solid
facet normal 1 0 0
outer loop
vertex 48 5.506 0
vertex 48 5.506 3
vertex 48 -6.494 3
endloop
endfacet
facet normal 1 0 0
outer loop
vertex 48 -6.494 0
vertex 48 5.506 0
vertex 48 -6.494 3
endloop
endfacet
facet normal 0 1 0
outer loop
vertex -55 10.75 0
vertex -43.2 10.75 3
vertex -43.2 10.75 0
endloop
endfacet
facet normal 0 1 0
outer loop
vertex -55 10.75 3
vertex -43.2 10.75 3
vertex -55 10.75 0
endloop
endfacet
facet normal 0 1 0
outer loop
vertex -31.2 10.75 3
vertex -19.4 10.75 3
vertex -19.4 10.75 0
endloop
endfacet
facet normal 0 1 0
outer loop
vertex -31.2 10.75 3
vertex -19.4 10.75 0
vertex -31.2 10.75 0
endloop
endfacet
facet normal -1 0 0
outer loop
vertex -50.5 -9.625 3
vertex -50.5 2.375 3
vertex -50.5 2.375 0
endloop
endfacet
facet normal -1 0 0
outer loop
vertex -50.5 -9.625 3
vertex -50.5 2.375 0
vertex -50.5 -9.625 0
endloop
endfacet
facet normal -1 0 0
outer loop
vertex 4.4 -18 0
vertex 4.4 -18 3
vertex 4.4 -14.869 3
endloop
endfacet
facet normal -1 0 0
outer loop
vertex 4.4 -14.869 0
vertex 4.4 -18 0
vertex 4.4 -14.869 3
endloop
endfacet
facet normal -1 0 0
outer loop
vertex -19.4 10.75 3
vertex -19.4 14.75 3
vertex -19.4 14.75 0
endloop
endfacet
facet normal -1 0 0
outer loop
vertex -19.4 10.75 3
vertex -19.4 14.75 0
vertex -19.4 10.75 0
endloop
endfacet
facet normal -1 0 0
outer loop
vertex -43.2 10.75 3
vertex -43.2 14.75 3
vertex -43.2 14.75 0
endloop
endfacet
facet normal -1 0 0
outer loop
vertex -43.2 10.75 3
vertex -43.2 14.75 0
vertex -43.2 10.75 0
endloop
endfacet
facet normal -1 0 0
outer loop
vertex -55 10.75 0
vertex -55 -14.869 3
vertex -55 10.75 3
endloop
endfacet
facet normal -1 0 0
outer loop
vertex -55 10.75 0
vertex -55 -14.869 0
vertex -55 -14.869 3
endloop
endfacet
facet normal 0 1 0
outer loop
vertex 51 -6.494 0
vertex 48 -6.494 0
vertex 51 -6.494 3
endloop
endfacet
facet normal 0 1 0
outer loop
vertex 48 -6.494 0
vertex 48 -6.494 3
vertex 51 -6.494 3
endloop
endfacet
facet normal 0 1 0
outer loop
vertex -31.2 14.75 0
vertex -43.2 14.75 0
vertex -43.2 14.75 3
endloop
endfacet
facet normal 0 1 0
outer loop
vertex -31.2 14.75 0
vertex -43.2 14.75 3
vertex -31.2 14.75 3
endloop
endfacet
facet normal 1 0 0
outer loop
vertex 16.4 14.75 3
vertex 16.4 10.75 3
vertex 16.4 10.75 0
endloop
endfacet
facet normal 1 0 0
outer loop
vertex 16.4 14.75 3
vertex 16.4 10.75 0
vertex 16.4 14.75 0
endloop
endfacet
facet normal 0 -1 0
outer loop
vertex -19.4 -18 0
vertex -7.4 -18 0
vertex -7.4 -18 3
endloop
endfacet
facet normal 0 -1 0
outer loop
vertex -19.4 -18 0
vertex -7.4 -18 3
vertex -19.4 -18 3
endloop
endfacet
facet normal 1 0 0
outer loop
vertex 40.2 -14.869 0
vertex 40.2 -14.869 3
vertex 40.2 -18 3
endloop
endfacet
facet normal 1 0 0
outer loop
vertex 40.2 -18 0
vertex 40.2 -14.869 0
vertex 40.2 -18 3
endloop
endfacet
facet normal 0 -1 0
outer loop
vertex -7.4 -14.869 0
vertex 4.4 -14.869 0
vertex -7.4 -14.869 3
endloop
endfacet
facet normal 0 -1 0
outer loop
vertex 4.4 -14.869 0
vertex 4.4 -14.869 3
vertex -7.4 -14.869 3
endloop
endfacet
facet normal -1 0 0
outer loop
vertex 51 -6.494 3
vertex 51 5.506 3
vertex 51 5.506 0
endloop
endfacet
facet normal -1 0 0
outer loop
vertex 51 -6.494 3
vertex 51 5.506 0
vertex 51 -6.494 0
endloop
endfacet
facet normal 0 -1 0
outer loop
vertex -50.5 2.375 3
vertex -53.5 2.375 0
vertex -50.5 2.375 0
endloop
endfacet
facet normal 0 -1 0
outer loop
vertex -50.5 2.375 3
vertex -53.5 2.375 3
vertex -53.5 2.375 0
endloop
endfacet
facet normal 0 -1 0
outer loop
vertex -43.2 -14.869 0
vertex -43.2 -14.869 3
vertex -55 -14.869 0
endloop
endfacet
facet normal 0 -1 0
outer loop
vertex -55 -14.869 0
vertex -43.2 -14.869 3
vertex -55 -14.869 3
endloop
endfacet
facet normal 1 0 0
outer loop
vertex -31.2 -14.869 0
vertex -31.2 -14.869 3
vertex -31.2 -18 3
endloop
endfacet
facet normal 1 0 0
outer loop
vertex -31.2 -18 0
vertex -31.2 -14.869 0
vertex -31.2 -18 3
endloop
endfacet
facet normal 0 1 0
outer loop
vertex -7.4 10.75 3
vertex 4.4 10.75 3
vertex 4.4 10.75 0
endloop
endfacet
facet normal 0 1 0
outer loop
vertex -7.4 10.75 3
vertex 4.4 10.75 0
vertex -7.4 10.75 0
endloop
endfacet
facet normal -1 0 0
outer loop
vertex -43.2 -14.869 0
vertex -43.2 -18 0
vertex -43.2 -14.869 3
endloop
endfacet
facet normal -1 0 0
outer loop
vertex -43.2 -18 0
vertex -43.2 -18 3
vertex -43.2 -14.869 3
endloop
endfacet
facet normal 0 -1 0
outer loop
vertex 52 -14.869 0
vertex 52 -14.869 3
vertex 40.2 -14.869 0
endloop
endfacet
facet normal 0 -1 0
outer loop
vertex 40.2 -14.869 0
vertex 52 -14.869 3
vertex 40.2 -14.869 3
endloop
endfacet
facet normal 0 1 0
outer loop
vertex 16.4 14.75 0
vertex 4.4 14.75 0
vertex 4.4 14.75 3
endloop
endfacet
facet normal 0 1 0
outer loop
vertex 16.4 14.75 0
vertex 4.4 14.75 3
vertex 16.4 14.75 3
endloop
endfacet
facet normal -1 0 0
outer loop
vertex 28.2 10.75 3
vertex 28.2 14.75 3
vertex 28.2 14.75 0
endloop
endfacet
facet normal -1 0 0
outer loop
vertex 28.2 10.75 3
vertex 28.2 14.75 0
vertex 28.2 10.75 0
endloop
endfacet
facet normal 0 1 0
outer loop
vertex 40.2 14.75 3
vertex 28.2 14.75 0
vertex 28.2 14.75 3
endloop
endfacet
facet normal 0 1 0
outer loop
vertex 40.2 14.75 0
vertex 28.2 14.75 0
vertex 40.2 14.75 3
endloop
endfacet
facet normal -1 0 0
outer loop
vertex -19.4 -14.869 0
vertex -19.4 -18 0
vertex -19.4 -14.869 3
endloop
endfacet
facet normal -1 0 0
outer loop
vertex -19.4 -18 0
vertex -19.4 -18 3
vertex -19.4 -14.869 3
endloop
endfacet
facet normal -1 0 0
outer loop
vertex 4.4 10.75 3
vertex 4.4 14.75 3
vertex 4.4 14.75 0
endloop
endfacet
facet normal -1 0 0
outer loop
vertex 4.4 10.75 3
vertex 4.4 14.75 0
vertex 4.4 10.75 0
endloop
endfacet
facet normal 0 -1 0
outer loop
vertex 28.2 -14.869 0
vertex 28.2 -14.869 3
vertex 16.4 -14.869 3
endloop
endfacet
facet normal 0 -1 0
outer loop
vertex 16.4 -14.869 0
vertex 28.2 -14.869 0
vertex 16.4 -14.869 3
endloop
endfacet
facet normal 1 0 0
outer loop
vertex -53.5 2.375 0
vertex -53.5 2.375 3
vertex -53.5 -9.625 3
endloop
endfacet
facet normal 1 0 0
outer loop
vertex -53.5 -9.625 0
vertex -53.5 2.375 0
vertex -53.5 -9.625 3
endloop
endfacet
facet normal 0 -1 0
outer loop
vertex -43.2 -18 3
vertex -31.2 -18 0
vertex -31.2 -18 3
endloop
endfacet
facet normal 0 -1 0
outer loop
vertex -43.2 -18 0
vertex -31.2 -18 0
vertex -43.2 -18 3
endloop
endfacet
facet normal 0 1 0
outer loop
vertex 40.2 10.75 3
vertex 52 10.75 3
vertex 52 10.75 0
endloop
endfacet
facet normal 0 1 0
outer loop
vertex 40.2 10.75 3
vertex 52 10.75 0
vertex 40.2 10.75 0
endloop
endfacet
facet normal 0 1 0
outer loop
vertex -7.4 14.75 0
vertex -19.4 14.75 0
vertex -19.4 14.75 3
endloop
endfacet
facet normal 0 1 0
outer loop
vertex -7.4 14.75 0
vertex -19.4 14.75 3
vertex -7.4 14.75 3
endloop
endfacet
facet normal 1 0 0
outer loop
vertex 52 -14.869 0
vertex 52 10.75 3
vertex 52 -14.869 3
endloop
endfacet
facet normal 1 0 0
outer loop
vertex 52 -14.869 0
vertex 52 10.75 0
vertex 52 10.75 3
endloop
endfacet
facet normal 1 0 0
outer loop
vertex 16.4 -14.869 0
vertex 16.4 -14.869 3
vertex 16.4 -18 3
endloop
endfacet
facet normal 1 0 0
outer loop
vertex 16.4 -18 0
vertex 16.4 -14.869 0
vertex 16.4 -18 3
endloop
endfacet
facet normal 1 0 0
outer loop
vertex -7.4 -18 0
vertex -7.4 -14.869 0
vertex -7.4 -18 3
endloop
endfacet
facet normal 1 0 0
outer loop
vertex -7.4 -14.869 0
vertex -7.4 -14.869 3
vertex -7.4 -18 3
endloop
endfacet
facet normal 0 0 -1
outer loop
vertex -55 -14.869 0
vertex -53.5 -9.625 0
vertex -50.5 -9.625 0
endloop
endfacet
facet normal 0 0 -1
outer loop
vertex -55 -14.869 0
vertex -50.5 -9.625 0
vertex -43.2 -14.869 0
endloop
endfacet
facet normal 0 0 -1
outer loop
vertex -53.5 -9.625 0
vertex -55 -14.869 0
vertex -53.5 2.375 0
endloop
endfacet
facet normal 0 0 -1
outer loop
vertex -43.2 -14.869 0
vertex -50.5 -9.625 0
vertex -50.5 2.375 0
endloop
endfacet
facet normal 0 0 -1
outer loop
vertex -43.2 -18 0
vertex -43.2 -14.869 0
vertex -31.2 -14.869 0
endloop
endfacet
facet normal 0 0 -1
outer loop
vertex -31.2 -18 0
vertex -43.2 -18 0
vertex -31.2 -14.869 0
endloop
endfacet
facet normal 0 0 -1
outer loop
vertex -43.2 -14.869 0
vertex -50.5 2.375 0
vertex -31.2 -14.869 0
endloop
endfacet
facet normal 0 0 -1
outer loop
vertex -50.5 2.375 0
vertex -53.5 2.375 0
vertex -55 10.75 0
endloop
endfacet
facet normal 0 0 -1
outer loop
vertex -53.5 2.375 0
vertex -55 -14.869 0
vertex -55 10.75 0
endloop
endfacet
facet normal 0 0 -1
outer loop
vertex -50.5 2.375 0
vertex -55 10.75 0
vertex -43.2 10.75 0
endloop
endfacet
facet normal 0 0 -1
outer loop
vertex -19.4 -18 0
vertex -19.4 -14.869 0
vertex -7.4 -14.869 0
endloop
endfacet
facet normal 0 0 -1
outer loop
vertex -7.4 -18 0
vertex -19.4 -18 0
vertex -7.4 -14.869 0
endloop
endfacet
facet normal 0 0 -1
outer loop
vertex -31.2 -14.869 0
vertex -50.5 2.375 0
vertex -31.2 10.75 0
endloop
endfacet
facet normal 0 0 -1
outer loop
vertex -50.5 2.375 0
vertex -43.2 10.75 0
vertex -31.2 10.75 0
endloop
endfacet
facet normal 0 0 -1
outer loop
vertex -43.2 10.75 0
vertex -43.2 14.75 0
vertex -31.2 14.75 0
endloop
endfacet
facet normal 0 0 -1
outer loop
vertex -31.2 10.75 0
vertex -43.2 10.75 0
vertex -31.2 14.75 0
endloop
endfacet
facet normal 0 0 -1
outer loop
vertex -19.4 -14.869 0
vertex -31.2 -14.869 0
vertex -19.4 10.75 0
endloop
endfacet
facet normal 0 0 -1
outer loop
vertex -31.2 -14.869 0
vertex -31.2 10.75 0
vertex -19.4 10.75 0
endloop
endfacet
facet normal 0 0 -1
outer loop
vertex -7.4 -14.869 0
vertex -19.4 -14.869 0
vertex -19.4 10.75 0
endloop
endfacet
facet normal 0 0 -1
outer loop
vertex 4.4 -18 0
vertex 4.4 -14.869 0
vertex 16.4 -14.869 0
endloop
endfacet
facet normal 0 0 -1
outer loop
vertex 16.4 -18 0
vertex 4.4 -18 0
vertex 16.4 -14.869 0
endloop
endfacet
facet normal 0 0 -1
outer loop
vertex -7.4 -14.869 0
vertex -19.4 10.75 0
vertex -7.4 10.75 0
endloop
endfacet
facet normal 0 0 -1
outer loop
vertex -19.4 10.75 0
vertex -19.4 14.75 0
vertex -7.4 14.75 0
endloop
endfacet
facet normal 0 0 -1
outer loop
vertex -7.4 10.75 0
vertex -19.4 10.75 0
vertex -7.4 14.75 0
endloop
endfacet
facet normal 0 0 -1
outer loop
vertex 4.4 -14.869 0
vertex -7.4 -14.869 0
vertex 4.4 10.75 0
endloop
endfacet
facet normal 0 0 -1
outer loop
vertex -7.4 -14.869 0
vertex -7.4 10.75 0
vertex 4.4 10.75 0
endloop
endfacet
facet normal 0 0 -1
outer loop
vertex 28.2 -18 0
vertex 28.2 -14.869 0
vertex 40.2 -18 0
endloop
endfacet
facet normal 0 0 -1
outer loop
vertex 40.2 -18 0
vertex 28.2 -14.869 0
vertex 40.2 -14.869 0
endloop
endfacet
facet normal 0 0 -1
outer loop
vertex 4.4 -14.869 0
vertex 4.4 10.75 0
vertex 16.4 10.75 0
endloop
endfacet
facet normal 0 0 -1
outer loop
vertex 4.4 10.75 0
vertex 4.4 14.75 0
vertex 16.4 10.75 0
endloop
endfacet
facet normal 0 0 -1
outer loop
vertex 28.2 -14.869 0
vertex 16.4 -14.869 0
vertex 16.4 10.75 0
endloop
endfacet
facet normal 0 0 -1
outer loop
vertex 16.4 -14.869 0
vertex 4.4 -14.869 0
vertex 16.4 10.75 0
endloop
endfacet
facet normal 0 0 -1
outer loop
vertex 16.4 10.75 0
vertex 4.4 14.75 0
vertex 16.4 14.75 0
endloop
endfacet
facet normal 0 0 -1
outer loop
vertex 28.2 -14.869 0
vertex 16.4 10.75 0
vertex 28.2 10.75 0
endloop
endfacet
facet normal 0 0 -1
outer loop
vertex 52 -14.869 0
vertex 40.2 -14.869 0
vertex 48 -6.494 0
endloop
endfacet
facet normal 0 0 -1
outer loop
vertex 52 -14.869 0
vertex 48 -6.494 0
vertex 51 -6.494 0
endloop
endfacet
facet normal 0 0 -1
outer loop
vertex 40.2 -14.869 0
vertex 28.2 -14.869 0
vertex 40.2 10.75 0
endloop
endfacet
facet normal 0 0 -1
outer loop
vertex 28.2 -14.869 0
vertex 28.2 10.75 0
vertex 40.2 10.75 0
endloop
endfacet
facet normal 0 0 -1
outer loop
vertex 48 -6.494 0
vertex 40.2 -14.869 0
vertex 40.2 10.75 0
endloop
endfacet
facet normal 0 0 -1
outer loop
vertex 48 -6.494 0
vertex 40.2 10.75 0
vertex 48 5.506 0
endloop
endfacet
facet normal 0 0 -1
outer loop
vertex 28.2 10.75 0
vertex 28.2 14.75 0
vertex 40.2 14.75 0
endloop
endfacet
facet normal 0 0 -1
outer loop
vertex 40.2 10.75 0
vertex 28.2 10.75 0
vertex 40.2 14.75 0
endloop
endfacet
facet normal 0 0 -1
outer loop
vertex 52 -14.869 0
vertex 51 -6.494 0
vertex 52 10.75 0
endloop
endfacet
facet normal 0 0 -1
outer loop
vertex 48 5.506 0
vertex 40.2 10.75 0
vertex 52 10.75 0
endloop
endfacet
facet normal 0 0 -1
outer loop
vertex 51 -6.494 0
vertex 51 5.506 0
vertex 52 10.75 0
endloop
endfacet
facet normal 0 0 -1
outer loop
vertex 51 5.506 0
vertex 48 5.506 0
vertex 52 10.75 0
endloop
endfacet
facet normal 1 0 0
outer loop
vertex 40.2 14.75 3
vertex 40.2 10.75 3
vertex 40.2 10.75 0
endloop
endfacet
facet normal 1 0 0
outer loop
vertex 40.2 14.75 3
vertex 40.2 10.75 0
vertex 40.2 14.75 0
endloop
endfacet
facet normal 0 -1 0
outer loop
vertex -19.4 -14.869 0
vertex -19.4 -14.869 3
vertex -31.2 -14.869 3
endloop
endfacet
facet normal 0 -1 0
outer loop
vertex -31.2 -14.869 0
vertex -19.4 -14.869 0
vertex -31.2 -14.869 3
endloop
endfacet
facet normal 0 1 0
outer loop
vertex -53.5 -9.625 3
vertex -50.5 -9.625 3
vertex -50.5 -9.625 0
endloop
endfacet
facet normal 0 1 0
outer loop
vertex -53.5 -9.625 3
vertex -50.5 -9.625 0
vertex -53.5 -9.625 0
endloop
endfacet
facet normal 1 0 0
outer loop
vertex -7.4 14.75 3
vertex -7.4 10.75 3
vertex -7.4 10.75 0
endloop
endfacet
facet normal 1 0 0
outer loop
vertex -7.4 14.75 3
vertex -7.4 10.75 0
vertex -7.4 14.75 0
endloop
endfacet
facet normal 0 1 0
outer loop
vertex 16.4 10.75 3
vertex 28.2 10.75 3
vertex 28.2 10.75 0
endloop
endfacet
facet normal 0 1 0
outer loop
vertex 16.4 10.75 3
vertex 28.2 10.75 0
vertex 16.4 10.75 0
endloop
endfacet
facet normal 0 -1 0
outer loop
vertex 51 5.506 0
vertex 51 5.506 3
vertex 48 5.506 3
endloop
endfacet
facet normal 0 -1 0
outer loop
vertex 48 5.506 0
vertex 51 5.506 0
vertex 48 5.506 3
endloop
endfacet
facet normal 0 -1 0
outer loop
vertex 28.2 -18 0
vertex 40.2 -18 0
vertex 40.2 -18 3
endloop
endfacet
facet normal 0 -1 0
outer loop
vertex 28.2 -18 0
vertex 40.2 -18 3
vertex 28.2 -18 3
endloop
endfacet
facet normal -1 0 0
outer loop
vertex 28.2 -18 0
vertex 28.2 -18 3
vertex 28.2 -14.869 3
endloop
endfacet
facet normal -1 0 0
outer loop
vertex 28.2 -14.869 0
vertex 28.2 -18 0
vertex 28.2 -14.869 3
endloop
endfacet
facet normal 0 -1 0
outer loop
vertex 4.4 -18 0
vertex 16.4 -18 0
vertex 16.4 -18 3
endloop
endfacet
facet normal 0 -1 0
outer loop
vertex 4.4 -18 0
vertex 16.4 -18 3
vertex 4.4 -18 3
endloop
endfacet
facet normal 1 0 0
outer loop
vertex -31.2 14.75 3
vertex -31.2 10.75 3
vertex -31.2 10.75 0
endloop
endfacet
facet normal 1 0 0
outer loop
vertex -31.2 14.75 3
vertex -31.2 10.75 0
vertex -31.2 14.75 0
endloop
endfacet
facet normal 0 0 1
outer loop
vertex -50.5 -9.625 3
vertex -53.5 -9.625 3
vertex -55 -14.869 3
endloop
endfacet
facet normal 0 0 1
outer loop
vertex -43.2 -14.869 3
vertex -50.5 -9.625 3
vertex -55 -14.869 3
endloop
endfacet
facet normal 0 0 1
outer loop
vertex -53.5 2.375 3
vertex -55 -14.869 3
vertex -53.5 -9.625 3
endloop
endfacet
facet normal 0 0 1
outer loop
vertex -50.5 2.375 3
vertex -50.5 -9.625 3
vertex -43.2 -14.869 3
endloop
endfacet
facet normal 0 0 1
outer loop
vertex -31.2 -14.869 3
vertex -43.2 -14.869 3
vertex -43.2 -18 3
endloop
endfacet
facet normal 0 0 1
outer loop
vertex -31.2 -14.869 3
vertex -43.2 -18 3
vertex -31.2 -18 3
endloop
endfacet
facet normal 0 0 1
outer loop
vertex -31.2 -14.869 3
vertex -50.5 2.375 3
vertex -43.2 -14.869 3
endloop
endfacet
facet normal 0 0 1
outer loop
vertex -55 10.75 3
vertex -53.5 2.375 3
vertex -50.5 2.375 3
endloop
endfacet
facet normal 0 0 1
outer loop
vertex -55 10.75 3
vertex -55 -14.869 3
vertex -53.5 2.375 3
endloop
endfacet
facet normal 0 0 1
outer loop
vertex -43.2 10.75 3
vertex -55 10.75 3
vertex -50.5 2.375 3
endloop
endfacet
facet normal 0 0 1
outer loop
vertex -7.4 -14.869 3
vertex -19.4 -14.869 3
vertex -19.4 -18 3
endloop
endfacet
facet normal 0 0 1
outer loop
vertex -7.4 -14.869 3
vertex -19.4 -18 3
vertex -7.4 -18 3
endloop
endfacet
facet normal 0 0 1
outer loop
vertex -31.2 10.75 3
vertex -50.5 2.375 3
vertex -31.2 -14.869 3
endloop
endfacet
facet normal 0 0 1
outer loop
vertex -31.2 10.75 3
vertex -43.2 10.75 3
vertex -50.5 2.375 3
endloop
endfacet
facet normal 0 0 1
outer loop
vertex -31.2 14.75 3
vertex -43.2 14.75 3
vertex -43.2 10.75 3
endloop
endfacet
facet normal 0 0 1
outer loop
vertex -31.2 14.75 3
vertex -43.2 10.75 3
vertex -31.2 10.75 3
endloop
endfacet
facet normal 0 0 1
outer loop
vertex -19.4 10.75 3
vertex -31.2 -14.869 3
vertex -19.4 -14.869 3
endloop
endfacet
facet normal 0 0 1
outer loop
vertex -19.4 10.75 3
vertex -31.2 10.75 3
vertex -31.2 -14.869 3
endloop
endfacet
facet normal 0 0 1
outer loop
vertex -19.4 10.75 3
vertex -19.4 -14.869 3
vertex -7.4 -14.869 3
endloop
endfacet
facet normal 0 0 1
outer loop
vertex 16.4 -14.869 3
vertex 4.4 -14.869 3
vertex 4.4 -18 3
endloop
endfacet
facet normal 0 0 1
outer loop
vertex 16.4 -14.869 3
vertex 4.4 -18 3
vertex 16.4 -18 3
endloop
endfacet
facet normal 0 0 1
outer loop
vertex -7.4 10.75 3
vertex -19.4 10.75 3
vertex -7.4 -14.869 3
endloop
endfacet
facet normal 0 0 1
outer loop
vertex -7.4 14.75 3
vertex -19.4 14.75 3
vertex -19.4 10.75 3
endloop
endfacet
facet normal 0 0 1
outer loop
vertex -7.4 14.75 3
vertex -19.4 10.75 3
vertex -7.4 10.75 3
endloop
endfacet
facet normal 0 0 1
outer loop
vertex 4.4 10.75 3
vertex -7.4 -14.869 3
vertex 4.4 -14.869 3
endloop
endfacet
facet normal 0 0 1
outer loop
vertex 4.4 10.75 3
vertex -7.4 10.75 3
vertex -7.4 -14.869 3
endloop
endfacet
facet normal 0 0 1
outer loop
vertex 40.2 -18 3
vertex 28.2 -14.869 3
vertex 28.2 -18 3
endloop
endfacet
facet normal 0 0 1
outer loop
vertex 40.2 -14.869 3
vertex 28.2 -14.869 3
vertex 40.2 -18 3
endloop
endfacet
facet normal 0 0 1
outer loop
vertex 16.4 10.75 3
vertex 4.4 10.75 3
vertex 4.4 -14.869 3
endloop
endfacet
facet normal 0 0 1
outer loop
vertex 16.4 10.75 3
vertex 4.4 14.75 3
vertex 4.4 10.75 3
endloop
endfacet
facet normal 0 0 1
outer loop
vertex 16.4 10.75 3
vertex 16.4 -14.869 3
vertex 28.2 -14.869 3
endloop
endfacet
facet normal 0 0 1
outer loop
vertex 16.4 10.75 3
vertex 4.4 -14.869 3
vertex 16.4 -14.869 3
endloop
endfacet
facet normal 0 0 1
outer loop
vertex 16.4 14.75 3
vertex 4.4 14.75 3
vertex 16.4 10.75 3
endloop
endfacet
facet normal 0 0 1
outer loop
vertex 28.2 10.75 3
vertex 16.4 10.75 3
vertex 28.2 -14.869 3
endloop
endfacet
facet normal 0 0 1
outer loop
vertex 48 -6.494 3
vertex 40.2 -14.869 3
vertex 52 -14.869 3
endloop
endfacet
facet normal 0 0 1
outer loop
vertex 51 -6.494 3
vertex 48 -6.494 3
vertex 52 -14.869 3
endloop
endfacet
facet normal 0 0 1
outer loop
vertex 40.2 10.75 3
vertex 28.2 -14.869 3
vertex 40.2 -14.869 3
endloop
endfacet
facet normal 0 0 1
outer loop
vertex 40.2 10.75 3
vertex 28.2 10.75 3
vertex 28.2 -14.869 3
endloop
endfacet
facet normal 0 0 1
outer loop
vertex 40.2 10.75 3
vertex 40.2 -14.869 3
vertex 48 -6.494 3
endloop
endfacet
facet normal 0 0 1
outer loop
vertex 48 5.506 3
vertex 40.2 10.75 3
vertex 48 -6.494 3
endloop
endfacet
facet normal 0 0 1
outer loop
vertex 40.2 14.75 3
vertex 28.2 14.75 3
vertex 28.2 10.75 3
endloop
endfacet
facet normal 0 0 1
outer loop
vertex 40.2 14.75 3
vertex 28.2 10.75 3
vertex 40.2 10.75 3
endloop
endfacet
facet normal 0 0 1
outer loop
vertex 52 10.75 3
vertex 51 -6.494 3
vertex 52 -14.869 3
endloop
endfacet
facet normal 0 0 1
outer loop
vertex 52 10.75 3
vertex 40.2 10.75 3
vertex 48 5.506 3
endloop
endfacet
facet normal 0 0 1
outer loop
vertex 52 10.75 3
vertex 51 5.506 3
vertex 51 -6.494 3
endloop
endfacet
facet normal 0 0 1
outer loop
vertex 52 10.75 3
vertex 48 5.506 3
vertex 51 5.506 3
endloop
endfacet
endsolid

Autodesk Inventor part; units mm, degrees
ref_plane "YZ Plane" through (0, 0, 0) normal (1, 0, 0) x (0, 1, 0)
ref_plane "XZ Plane" through (0, 0, 0) normal (0, 1, 0) x (-1, 0, 0)
ref_plane "XY Plane" through (0, 0, 0) normal (0, 0, 1) x (1, 0, 0)
sketch "Esboço1" plane through (0, 0, 0) normal (0, 0, 1) x (1, 0, 0)
  line L0 (-55, 14.75) -> (52, 14.75)
  line L1 (52, 14.75) -> (52, -18)
  line L2 (52, -18) -> (-55, -18)
  line L3 (-55, -18) -> (-55, 14.75)
  line L4 (52.0001, 13.75) -> (52.0001, 10.75) projected
  line L5 (-50.5, -18) -> (-53.5, -18)
  point P0 (0, 0)
  dimension "d34" = 52
  dimension "d35" = 18
  dimension "d36" = 14.75
extrude "Extrusão1" add sketch "Esboço1" along normal blind 3
sketch "Esboço2" plane through (0, 0, 3) normal (0, 0, 1) x (1, 0, 0)
  line L0 (19.2209, 13.75) -> (19.2209, 10.75) projected
  line L1 (52, 14.75) -> (-55, 14.75) projected
  line L2 (-55, 14.75) -> (-55, -18) projected
  line L3 (-55, 14.75) -> (-43.2, 14.75)
  line L4 (-43.2, 14.75) -> (-43.2, 10.75)
  line L5 (-43.2, 10.75) -> (-55, 10.75)
  line L6 (-55, 10.75) -> (-55, 14.75)
  line L7 (-19.4, 14.75) -> (-19.4, 10.75)
  line L8 (-19.4, 10.75) -> (-31.2, 10.75)
  line L9 (-31.2, 10.75) -> (-31.2, 14.75)
  line L10 (-31.2, 14.75) -> (-19.4, 14.75)
  line L11 (4.4, 14.75) -> (4.4, 10.75)
  line L12 (4.4, 10.75) -> (-7.4, 10.75)
  line L13 (-7.4, 10.75) -> (-7.4, 14.75)
  line L14 (-7.4, 14.75) -> (4.4, 14.75)
  line L15 (28.2, 14.75) -> (28.2, 10.75)
  line L16 (28.2, 10.75) -> (16.4, 10.75)
  line L17 (16.4, 10.75) -> (16.4, 14.75)
  line L18 (16.4, 14.75) -> (28.2, 14.75)
  line L19 (-55, -18) -> (-43.2, -18)
  line L20 (-43.2, -18) -> (-43.2, -14.869)
  line L21 (-43.2, -14.869) -> (-55, -14.869)
  line L22 (-55, -14.869) -> (-55, -18)
  line L23 (-19.4, -18) -> (-19.4, -14.869)
  line L24 (-31.2, -18) -> (-19.4, -18)
  line L25 (-31.2, -14.869) -> (-31.2, -18)
  line L26 (-19.4, -14.869) -> (-31.2, -14.869)
  line L27 (4.4, -18) -> (4.4, -14.869)
  line L28 (-7.4, -18) -> (4.4, -18)
  line L29 (-7.4, -14.869) -> (-7.4, -18)
  line L30 (4.4, -14.869) -> (-7.4, -14.869)
  line L31 (28.2, -18) -> (28.2, -14.869)
  line L32 (16.4, -18) -> (28.2, -18)
  line L33 (16.4, -14.869) -> (16.4, -18)
  line L34 (28.2, -14.869) -> (16.4, -14.869)
  line L35 (52, -18) -> (52, -14.869)
  line L36 (40.2, -18) -> (52, -18)
  line L37 (40.2, -14.869) -> (40.2, -18)
  line L38 (52, -14.869) -> (40.2, -14.869)
  line L39 (-53.4999, 2.375) -> (-50.4999, 2.375) projected
  line L40 (-50.4999, 2.375) -> (-50.4999, -9.625) projected
  line L41 (-50.4999, -9.625) -> (-53.4999, -9.625) projected
  line L42 (-53.4999, 2.375) -> (-53.4999, -9.625) projected
  line L43 (-53.4999, -9.625) -> (-50.4999, -9.625)
  line L44 (-50.4999, -9.625) -> (-50.4999, 2.375)
  line L45 (-50.4999, 2.375) -> (-53.4999, 2.375)
  line L46 (-53.4999, 2.375) -> (-53.4999, -9.625)
  line L47 (52, 14.75) -> (52, 10.75)
  line L48 (52, 10.75) -> (40.2, 10.75)
  line L49 (40.2, 10.75) -> (40.2, 14.75)
  line L50 (40.2, 14.75) -> (52, 14.75)
  line L51 (51, 5.506) -> (48, 5.506) projected
  line L52 (48, 5.506) -> (48, -6.494) projected
  line L53 (48, -6.494) -> (51, -6.494) projected
  line L54 (51, 5.506) -> (51, -6.494) projected
  line L55 (48, 5.506) -> (51, 5.506)
  line L56 (51, 5.506) -> (51, -6.494)
  line L57 (51, -6.494) -> (48, -6.494)
  line L58 (48, -6.494) -> (48, 5.506)
  point P0 (52, -18)
  point P1 (4.4, 14.75)
  point P2 (-43.2, 14.75)
  dimension "d37" = 11.8
  dimension "d38" = 4
  dimension "d41" = 23.8
  dimension "d46" = 11.8
  dimension "d49" = 23.8
extrude "Extrusão2" cut sketch "Esboço2" against normal through all
properties part number "Acrilico-Parachoque-Parede-Inf"
